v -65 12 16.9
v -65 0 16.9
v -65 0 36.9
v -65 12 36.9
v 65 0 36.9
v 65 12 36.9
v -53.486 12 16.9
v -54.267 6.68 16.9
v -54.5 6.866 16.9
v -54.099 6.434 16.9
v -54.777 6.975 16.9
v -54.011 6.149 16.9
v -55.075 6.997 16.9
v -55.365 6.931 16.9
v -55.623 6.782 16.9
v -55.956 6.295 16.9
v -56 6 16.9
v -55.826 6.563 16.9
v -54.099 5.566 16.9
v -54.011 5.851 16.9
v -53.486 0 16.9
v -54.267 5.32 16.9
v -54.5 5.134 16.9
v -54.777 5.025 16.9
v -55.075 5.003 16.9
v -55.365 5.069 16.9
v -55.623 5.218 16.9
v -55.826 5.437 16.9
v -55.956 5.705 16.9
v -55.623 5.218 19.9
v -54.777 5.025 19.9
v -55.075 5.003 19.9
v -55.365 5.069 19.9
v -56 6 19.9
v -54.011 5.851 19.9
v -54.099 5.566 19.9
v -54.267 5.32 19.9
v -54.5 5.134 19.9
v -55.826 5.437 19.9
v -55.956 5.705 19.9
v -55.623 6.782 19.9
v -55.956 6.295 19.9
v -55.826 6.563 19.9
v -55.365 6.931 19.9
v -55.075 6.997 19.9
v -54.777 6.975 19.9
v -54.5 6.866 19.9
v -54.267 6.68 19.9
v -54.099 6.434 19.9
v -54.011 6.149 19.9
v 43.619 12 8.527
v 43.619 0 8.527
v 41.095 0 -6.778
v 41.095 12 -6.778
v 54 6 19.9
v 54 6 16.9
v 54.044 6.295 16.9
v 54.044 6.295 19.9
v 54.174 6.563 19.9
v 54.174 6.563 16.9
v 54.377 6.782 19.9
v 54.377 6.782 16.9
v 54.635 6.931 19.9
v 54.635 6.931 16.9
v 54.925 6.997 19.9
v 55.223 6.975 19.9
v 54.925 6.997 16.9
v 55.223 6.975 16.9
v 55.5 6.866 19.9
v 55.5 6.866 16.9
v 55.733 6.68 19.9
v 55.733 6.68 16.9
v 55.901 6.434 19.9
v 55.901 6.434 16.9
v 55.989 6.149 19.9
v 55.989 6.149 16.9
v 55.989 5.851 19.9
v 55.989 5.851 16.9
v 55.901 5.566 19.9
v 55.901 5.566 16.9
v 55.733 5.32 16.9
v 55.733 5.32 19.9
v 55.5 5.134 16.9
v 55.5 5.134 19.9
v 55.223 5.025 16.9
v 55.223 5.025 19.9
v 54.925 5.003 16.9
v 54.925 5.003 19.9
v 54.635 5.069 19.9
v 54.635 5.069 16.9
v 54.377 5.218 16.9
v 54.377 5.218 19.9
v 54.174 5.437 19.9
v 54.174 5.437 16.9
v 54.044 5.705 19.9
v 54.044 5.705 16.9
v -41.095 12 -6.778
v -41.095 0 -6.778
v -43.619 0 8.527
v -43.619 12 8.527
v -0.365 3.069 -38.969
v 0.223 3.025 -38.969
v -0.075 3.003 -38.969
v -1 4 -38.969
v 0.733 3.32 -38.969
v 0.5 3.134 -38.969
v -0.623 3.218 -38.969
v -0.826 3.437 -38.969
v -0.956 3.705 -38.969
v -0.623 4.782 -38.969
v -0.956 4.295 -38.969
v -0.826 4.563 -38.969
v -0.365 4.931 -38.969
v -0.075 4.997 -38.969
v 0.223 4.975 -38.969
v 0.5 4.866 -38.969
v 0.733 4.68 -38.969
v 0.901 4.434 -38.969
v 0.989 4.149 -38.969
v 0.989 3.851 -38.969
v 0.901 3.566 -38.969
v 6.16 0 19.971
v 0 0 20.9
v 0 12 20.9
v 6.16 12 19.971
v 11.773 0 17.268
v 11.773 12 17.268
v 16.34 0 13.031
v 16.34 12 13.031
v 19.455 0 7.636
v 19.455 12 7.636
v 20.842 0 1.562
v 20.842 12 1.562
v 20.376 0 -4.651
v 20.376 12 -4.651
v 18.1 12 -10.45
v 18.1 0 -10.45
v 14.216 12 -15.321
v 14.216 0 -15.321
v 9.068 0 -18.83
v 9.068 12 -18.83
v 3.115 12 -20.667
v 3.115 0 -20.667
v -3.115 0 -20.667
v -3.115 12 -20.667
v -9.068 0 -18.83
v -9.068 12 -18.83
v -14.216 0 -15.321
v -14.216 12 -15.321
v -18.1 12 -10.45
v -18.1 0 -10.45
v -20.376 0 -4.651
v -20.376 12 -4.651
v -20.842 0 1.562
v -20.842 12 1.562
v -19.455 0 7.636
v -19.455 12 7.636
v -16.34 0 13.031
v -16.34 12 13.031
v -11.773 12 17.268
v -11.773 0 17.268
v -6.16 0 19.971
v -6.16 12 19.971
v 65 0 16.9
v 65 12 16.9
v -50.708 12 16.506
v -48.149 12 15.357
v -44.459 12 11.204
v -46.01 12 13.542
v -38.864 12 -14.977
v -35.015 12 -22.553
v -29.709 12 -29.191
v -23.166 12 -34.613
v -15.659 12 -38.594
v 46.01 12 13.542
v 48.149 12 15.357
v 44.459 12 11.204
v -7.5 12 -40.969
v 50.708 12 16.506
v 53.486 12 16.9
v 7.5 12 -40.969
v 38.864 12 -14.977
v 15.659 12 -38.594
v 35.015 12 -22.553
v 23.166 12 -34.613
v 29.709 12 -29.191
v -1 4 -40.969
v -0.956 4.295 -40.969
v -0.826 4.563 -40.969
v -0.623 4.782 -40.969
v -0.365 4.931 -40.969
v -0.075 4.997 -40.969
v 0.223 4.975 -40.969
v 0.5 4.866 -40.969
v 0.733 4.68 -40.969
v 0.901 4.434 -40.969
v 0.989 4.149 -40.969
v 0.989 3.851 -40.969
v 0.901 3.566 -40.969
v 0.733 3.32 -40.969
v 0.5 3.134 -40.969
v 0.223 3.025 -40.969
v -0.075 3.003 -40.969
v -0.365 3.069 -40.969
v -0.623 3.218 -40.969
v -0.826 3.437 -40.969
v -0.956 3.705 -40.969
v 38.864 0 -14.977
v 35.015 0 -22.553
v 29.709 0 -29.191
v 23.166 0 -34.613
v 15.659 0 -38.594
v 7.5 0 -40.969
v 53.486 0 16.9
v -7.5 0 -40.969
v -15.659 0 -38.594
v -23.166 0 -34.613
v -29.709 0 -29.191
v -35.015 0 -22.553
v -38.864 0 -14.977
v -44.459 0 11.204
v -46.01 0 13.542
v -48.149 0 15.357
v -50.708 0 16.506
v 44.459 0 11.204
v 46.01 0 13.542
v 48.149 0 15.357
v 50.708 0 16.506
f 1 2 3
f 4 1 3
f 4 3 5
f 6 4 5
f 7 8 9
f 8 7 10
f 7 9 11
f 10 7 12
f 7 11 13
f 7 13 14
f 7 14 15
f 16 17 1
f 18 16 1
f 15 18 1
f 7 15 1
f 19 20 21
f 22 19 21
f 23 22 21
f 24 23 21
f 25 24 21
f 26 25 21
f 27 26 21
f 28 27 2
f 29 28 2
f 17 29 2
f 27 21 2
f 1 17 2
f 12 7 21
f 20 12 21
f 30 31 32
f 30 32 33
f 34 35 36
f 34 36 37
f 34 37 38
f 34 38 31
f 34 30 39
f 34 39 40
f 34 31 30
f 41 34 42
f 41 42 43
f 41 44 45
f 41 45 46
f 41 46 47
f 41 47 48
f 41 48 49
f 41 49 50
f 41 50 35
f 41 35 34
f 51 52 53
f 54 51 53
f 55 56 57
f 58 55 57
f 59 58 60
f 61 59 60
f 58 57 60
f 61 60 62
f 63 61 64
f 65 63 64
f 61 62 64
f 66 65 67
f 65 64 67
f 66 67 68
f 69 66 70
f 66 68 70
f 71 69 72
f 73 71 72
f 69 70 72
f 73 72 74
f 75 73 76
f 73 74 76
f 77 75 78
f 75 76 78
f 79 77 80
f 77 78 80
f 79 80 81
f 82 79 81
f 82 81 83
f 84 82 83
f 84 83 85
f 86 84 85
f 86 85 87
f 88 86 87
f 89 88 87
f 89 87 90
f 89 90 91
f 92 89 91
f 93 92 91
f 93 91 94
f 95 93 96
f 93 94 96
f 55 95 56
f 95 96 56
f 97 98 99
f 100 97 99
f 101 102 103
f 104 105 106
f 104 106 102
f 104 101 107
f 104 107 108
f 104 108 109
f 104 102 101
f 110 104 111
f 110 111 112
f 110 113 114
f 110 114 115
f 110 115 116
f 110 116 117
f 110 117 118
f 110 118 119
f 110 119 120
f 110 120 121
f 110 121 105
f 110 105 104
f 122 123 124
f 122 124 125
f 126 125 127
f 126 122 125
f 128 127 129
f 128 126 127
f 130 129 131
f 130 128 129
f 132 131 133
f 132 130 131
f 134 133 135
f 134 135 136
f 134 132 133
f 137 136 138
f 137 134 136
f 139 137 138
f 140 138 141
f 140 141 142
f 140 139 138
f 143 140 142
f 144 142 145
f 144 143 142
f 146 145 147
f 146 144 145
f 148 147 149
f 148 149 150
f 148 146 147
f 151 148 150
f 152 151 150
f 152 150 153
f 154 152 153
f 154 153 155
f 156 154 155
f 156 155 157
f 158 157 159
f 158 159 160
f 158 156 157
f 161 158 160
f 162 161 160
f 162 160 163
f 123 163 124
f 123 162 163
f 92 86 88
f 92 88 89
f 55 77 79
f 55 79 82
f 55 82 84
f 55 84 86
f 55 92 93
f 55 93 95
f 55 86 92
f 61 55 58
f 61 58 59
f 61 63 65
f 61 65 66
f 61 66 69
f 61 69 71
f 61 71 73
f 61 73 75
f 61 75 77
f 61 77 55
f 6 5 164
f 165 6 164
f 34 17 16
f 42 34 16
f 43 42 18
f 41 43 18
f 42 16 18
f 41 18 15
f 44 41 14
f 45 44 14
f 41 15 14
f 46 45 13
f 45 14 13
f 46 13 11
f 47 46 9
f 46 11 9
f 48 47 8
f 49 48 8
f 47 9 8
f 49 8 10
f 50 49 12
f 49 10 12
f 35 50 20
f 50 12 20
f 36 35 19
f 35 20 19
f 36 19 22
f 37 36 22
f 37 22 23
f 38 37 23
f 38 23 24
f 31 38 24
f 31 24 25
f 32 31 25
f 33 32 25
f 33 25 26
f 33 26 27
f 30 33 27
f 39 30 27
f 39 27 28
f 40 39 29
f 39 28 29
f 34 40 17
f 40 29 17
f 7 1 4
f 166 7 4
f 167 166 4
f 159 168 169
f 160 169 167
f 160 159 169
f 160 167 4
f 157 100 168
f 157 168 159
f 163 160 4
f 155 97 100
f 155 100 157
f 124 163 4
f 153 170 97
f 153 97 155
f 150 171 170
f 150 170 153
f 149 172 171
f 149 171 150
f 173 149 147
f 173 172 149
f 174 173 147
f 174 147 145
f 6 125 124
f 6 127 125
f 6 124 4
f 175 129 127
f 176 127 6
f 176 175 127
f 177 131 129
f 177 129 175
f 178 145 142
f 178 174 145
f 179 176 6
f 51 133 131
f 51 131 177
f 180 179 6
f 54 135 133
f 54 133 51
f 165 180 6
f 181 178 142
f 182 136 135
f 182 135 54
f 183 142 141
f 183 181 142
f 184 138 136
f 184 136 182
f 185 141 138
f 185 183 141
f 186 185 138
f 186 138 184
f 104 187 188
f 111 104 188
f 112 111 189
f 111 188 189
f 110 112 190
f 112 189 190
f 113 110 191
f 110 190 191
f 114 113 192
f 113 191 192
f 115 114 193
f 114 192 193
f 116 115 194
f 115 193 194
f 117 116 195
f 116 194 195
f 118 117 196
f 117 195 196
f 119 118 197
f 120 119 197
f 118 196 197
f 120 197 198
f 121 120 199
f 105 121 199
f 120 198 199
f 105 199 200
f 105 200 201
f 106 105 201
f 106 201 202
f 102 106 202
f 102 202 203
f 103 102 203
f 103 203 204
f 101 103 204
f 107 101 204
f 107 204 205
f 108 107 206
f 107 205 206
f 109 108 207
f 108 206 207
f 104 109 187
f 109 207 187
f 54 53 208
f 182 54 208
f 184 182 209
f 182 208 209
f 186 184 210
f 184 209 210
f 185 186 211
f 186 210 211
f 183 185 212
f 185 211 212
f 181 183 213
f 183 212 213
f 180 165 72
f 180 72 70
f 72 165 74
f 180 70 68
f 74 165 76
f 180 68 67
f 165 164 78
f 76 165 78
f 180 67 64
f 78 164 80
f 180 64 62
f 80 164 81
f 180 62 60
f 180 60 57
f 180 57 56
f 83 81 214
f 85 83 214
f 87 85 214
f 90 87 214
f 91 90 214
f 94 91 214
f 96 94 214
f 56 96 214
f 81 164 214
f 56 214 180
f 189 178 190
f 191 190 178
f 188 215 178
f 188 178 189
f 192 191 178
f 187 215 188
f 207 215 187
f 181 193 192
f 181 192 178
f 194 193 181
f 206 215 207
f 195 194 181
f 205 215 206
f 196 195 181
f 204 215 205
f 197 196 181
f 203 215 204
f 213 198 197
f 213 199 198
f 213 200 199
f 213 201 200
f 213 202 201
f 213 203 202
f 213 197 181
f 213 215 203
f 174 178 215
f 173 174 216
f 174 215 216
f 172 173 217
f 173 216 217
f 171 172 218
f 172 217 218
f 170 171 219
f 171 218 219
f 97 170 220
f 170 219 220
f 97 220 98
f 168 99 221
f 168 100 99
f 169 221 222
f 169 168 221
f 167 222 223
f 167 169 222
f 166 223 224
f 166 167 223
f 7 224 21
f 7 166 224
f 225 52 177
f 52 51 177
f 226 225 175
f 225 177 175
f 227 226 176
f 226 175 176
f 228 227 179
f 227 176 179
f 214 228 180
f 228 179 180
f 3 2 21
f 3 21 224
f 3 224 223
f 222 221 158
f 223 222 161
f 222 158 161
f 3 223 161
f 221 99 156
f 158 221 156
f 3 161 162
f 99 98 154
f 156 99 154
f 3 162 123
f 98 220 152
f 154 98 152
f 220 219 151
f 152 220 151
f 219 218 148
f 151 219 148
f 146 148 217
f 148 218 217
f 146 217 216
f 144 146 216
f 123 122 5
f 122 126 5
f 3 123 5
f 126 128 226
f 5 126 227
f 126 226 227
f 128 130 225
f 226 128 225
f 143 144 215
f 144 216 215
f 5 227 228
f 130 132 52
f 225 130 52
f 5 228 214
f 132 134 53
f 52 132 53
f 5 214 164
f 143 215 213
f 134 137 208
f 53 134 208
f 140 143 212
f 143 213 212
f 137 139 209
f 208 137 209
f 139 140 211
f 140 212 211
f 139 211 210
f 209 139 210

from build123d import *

# Parameters (mm, degrees)
SKETCH1_R           = 20.9
BOSS_EXTRUDE1_DEPTH = 12
SKETCH2_R           = 1
CUT_EXTRUDE1_DEPTH  = 3
SKETCH3_R           = 1
CUT_EXTRUDE2_DEPTH  = 3
FILLET1_R           = 10
SKETCH4_W           = 15
SKETCH4_H           = 3.988700157
CUT_EXTRUDE3_DEPTH  = 79.126323989
SKETCH8_R           = 1
CUT_EXTRUDE4_DEPTH  = 2


with BuildPart() as part:
    # Sketch1 → Boss-Extrude1 (new body)
    with BuildSketch(Plane(origin=(0, 0, 0), x_dir=(1, 0, 0), z_dir=(0, 1, 0))):
        with BuildLine():
            Line((-41.094820281, 6.777775896), (-45, -16.9))
            Line((-45, -16.9), (-65, -16.9))
            Line((-65, -16.9), (-65, -36.9))
            Line((-65, -36.9), (65, -36.9))
            Line((65, -36.9), (65, -16.9))
            Line((65, -16.9), (45, -16.9))
            Line((45, -16.9), (41.094820281, 6.777775896))
            ThreePointArc((41.094820281, 6.777775896), (0, 41.65), (-41.094820281, 6.777775896))
        make_face()
        with Locations(Location((0, 0, 0), (0, 0, 270))):
            Circle(SKETCH1_R, mode=Mode.SUBTRACT)
    extrude(amount=BOSS_EXTRUDE1_DEPTH)

    # Sketch2 → Cut-Extrude1 (cut)
    with BuildSketch(Plane(origin=(0, 0, 16.9), x_dir=(-1, 0, 0), z_dir=(0, 0, -1))):
        with Locations((-55, 6)):
            Circle(SKETCH2_R)
    extrude(amount=-CUT_EXTRUDE1_DEPTH, mode=Mode.SUBTRACT)

    # Sketch3 → Cut-Extrude2 (cut)
    with BuildSketch(Plane(origin=(0, 0, 16.9), x_dir=(-1, 0, 0), z_dir=(0, 0, -1))):
        with Locations((55, 6)):
            Circle(SKETCH3_R)
    extrude(amount=-CUT_EXTRUDE2_DEPTH, mode=Mode.SUBTRACT)

    # Fillet1
    fillet1_edges = [part.edges().sort_by_distance(p)[0] for p in [
        (-45, 6, 16.9),
        (45, 6, 16.9),
    ]]
    fillet(fillet1_edges, radius=FILLET1_R)

    # Sketch4 → Cut-Extrude3 (cut, through all)
    with BuildSketch(Plane.XZ):
        with Locations((0, -42.963515313)):
            Rectangle(SKETCH4_W, SKETCH4_H)
    extrude(amount=-CUT_EXTRUDE3_DEPTH, mode=Mode.SUBTRACT)

    # Sketch8 → Cut-Extrude4 (cut)
    with BuildSketch(Plane(origin=(0, 0, -40.969165234), x_dir=(-1, 0, 0), z_dir=(0, 0, -1))):
        with Locations((0, 4)):
            Circle(SKETCH8_R)
    extrude(amount=-CUT_EXTRUDE4_DEPTH, mode=Mode.SUBTRACT)


solid = part.part
